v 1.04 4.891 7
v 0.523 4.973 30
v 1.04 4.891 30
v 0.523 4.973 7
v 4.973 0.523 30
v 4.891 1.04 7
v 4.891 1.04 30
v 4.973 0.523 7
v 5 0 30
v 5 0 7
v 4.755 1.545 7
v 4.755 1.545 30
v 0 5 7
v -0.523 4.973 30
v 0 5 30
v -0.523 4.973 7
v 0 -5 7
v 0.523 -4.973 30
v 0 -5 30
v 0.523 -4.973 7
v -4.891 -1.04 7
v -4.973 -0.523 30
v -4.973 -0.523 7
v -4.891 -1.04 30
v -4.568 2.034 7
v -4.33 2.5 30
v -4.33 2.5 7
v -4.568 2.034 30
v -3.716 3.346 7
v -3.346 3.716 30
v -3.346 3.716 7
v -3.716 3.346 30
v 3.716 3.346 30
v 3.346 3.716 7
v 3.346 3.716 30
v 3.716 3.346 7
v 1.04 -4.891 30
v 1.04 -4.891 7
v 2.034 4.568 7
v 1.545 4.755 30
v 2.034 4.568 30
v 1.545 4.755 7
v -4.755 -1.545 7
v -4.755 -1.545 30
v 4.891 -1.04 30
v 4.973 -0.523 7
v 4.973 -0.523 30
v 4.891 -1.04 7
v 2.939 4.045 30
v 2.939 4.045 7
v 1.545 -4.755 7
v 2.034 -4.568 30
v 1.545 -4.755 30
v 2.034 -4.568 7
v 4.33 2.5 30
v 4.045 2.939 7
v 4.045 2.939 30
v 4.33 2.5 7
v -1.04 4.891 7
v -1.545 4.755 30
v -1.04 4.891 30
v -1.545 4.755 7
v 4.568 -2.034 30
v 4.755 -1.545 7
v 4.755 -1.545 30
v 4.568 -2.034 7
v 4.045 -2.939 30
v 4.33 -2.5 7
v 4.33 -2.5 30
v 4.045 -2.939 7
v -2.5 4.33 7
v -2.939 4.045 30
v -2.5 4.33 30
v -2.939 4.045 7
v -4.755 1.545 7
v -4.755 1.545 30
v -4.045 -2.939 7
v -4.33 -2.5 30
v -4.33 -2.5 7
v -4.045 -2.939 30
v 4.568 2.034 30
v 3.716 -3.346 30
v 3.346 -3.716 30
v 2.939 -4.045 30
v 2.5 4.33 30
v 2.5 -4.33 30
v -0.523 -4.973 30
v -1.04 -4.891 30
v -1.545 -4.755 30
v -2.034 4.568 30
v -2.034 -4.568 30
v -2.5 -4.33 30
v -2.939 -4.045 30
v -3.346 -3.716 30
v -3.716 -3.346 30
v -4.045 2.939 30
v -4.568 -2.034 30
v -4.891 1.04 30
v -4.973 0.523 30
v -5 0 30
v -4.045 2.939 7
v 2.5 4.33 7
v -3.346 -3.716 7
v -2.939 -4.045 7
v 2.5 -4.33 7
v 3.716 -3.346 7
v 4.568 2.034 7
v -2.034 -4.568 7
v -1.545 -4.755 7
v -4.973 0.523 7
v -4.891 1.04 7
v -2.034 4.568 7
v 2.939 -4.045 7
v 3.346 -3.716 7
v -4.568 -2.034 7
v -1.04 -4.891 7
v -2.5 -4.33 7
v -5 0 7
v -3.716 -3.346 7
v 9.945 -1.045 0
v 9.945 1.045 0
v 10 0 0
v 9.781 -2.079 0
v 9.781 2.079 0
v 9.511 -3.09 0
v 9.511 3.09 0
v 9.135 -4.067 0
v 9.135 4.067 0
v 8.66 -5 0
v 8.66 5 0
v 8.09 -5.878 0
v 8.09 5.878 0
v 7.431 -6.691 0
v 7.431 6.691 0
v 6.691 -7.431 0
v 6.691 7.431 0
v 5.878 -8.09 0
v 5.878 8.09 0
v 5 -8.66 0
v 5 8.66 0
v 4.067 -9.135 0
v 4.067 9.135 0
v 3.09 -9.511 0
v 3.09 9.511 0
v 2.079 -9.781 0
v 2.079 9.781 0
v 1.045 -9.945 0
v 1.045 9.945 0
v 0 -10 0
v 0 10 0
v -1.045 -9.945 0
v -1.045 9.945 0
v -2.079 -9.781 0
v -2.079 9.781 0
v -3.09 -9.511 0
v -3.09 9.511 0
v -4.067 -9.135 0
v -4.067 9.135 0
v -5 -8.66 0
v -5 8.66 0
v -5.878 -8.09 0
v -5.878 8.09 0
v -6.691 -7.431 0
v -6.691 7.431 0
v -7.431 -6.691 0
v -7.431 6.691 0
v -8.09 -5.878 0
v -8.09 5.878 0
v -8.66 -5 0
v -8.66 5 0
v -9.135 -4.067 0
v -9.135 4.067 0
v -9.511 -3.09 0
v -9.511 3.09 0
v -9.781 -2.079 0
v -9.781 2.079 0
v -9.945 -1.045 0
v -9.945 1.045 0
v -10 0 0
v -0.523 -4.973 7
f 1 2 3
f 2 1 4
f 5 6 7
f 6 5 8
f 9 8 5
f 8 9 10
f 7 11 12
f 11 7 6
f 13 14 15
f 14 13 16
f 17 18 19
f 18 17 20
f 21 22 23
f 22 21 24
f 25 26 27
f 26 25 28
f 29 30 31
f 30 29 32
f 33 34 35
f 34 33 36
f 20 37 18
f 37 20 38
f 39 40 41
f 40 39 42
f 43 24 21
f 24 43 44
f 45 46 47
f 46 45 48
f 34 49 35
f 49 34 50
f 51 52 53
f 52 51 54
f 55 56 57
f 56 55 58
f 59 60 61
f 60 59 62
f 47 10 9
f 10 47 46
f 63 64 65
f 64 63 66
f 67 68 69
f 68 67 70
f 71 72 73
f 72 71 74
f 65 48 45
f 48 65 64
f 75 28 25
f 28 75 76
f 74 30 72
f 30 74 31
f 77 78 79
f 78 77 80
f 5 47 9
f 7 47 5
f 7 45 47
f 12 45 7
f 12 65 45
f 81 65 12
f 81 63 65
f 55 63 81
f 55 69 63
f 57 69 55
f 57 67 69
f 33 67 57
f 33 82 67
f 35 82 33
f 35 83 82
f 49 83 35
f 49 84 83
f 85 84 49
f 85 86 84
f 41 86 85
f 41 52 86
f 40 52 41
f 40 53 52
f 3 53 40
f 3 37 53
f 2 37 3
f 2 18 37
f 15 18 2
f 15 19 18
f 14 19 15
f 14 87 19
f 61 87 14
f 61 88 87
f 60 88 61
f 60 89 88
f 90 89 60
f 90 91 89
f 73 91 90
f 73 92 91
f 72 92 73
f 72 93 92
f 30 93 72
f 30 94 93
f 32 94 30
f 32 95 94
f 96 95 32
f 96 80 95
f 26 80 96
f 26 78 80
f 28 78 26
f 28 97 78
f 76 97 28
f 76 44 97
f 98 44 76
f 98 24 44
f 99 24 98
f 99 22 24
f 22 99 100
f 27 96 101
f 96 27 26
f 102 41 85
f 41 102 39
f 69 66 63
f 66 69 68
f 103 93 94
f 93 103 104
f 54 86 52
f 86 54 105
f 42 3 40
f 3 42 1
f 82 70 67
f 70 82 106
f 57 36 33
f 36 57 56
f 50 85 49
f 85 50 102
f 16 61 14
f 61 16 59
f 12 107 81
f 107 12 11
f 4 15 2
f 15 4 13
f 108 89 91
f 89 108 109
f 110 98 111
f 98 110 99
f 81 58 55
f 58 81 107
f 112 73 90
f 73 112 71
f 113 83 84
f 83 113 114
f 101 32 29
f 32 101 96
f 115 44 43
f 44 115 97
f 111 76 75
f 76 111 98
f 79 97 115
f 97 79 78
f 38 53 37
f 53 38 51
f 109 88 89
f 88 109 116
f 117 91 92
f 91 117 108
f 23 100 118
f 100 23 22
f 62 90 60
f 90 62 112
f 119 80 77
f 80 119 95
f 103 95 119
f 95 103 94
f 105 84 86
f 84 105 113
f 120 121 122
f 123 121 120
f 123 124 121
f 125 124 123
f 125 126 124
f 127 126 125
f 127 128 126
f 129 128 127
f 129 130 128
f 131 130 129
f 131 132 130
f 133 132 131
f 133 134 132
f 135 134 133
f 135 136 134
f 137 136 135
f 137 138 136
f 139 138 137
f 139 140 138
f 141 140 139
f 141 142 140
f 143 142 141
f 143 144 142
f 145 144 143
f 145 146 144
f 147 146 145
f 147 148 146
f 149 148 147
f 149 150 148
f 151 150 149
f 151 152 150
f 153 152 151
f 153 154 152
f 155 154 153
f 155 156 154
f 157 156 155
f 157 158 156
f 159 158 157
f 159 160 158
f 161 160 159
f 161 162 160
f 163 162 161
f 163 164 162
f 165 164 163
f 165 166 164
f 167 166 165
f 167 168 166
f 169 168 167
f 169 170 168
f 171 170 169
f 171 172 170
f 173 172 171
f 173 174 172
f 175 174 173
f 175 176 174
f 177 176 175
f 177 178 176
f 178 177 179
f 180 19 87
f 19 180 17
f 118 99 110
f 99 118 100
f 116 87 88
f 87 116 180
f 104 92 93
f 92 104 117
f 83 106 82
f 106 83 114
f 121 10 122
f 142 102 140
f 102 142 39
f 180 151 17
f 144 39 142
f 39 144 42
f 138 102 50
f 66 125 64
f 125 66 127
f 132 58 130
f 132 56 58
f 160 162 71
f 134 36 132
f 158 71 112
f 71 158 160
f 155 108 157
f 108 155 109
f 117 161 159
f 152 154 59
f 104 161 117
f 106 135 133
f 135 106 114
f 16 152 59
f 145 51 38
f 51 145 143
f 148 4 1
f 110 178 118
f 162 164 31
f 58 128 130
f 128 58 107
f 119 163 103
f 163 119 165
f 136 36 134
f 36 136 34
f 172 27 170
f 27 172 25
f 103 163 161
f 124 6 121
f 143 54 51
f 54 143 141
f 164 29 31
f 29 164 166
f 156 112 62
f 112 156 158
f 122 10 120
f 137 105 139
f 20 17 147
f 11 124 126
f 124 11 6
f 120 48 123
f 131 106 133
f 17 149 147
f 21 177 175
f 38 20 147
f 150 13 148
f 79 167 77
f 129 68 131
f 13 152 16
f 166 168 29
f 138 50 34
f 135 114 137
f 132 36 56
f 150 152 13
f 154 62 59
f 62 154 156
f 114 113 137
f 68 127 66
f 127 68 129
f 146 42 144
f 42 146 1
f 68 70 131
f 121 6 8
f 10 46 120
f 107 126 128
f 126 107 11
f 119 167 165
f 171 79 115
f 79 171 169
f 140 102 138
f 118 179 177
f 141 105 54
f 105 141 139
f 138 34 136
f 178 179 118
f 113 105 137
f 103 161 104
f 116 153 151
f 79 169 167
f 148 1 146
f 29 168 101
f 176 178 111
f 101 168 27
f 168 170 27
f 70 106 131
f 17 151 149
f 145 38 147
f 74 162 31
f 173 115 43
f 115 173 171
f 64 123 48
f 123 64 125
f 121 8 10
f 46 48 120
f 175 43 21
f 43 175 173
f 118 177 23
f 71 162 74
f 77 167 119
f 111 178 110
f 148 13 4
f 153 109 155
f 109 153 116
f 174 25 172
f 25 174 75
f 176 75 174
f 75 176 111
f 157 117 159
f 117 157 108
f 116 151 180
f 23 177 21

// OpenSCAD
// Solid rivet.
$fn = 60;
eps = 0.02;
shank_d = 10;
head_d = 20;
length = 30;
union() { cylinder(d=shank_d,h=length); cylinder(d1=head_d,d2=shank_d,h=head_d*0.35); }
